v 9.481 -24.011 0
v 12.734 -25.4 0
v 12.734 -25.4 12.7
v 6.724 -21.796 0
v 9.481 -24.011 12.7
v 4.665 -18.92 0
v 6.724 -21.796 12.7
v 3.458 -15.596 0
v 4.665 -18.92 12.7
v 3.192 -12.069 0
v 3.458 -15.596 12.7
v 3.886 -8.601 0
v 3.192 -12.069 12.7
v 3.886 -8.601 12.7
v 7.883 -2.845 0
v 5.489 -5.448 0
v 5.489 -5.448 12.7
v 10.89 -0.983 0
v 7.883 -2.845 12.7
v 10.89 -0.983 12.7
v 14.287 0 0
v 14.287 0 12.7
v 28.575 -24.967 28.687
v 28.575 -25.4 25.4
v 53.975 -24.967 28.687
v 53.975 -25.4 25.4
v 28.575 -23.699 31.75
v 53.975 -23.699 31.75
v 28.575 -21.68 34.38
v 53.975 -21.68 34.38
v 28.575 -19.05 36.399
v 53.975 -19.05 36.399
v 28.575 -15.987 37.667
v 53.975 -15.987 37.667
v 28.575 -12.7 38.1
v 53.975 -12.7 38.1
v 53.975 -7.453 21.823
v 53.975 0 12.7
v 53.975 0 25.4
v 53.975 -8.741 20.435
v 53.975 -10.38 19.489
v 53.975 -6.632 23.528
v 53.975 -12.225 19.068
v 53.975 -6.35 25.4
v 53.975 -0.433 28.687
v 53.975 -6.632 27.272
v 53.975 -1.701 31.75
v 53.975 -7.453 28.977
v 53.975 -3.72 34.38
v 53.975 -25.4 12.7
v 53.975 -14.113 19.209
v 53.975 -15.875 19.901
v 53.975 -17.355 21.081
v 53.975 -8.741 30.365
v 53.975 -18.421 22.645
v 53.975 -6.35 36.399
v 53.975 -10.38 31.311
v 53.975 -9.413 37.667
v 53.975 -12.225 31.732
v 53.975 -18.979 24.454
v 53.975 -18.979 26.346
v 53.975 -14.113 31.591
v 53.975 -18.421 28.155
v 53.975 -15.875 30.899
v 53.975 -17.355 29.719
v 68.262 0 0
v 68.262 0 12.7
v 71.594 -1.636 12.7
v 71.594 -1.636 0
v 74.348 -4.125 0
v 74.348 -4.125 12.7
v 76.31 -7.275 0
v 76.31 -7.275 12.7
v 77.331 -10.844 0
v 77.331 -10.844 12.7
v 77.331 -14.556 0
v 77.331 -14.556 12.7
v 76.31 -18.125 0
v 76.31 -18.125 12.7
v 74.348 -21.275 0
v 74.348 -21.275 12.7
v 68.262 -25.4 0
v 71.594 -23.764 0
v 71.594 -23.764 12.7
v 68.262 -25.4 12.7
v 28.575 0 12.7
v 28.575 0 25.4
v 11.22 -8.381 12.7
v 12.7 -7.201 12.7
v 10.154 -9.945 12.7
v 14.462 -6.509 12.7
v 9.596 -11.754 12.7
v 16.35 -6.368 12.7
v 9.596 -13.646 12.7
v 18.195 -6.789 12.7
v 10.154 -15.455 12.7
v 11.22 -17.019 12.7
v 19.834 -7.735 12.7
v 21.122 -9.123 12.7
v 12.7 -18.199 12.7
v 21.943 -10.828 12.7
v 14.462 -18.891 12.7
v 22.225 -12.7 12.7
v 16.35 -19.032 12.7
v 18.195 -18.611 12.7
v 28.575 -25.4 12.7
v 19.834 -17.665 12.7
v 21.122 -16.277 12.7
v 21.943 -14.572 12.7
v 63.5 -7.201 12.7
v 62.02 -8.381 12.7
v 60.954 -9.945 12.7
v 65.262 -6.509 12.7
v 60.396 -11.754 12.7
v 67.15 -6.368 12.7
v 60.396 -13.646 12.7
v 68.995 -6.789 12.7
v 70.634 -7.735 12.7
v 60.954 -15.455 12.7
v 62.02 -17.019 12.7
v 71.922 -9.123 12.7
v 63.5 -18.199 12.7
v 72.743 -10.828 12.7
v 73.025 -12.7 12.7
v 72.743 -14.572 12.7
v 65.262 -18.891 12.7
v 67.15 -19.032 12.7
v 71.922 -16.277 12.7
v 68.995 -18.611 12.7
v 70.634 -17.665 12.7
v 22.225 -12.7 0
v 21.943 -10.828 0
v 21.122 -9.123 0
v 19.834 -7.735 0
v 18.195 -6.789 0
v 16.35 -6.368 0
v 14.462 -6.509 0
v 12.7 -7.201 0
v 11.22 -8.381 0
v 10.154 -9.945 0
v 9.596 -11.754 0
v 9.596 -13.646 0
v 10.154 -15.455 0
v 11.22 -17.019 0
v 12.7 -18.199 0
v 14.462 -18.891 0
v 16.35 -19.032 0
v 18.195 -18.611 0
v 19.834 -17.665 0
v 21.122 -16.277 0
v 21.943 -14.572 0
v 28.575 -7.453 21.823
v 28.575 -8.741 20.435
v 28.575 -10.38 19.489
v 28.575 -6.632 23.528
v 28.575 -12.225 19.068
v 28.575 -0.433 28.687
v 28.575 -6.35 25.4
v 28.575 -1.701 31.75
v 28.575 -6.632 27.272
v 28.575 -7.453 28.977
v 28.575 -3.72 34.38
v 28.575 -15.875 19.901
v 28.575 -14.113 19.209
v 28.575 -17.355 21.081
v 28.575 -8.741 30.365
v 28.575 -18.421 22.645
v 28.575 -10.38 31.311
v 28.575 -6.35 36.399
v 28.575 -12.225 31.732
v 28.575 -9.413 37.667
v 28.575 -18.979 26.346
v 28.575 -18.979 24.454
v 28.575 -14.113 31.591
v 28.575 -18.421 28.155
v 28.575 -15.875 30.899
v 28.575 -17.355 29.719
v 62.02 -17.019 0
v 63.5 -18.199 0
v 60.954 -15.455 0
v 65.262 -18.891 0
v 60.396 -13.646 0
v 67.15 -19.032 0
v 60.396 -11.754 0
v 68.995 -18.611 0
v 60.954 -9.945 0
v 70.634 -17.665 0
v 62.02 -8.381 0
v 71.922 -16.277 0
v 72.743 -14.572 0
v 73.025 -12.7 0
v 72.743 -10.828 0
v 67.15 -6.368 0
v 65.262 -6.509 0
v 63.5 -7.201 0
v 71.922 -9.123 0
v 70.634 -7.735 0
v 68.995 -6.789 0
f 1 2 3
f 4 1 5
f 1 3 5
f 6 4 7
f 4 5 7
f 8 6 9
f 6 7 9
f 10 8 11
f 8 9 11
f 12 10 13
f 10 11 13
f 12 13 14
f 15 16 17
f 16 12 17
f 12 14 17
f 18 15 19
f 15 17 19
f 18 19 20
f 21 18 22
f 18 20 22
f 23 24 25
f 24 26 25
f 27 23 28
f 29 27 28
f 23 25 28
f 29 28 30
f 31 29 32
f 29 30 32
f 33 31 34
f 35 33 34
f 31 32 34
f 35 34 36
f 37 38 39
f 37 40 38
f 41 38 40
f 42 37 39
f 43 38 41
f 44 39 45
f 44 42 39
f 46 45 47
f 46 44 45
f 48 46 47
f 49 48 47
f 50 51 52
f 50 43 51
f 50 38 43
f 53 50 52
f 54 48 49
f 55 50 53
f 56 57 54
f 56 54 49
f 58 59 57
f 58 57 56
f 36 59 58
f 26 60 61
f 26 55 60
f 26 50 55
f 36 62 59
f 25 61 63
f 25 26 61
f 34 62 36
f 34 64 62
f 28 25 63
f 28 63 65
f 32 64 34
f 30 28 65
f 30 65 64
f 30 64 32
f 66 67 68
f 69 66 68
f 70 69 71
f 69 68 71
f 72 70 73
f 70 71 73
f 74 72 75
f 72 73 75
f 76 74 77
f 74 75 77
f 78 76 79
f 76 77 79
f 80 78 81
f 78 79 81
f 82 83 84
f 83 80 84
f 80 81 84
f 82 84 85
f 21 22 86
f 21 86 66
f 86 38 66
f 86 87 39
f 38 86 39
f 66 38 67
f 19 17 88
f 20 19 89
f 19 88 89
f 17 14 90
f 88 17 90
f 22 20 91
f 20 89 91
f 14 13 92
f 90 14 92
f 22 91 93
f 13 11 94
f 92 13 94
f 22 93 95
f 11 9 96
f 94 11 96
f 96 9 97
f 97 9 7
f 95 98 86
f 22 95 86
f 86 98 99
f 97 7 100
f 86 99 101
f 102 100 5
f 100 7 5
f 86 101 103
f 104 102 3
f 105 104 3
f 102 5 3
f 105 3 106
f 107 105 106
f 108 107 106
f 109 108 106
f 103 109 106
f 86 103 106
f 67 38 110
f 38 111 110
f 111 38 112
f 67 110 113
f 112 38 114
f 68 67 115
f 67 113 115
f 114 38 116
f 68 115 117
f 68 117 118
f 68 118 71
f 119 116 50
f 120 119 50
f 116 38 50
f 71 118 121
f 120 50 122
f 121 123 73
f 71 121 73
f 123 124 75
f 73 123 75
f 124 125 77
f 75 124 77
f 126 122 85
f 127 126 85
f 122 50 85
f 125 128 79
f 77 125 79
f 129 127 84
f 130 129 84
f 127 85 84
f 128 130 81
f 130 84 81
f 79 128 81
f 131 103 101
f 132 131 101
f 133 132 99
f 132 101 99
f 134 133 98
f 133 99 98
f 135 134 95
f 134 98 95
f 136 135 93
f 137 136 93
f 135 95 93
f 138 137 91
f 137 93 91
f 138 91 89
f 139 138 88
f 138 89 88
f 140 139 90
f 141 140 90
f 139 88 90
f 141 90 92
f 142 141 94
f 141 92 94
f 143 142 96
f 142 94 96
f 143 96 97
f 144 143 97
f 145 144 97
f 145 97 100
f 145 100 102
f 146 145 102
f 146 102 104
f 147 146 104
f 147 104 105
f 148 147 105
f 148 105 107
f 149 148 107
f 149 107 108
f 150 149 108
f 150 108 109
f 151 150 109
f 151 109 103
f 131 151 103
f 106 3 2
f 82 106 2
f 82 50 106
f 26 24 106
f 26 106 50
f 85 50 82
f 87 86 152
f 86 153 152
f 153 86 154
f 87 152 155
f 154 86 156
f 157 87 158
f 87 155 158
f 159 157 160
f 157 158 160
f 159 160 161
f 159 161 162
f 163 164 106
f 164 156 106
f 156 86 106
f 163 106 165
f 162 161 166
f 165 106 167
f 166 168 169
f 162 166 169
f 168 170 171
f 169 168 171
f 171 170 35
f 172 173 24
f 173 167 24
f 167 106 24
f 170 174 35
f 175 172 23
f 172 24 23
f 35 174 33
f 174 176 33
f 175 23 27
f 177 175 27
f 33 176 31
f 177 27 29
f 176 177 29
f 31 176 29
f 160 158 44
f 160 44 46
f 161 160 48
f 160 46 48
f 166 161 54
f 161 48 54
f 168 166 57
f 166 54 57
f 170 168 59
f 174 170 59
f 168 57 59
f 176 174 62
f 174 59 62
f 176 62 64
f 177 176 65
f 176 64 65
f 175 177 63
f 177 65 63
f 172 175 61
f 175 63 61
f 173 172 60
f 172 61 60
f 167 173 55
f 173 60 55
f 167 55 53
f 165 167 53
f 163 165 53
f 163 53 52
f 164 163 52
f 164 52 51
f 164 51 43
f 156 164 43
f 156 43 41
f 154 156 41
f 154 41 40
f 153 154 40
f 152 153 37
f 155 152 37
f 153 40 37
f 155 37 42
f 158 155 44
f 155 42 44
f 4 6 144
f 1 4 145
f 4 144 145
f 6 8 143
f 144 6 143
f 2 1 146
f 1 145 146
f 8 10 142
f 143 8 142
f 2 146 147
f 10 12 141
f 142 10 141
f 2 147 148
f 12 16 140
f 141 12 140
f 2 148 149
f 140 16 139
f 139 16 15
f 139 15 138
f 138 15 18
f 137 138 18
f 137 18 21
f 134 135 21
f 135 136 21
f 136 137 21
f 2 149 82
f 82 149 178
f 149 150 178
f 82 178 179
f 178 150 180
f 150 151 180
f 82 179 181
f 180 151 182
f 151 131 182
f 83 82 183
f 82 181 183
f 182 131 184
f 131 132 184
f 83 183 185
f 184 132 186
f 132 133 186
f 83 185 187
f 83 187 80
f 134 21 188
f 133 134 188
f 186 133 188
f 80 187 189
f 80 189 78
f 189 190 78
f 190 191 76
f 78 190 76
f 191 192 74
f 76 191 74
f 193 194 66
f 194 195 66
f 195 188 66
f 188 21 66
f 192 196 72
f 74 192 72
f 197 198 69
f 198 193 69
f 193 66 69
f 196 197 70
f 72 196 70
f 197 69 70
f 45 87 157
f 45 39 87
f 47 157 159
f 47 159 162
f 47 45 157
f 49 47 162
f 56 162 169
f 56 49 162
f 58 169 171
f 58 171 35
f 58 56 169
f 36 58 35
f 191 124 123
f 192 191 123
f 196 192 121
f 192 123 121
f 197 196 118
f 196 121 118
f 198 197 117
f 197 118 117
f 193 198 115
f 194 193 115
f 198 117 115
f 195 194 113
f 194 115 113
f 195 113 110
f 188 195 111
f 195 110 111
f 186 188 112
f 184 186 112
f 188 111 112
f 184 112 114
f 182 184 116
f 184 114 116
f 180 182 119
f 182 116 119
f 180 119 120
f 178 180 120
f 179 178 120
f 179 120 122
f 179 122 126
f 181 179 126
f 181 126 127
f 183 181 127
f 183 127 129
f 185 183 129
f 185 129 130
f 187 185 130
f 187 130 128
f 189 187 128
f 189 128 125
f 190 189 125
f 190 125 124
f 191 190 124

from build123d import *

# Parameters (mm, degrees)
F0_W      = 82.55
F0_H      = 38.1
F1_DEPTH  = 25.4
F2_W      = 28.575
F2_H      = 25.4
F3_DEPTH  = 25.4
F4_R      = 12.69999
F6_DEPTH  = 25.4
F8_DEPTH  = 25.4
F9_R      = 6.35
F10_DEPTH = 25.4
F11_R     = 6.35
F12_DEPTH = 25.4
F13_R     = 6.35
F14_DEPTH = 25.4


# Not quite as in the source:
# - a fillet or chamfer is up to 0.001 mm smaller than in the source, because OpenCascade refuses the exact size
# - a feature names something its author has since deleted; it is built from what else it names


with BuildPart() as f1:
    # F0 (on Front) → F1 (new body)
    with BuildSketch(Plane.XZ):
        with Locations((41.275, 19.05)):
            Rectangle(F0_W, F0_H)
    extrude(amount=F1_DEPTH)

    # F2 (on face) → F3 (cut)
    with BuildSketch(Plane.XZ.offset(25.4)):
        with Locations((14.2875, 25.4)):
            Rectangle(F2_W, F2_H)
        with Locations((68.2625, 25.4)):
            Rectangle(F2_W, F2_H)
    extrude(amount=-F3_DEPTH, mode=Mode.SUBTRACT)

    # F4 (radius 12.7 in the source; OpenCascade refuses exactly that, so slightly less here)
    f4_edges = [f1.edges().sort_by_distance(p)[0] for p in [
        (41.275, 0, 38.1),
        (41.275, -25.4, 38.1),
    ]]
    fillet(f4_edges, radius=F4_R)

    # F5 (on face) → F6 (cut)
    with BuildSketch(Plane.XY.offset(12.7)):
        with BuildLine():
            ThreePointArc((68.2625, 0), (77.4605547287, -12.7), (68.2625, -25.4))
            Line((68.2625, -25.4), (82.55, -25.4))
            Line((82.55, -25.4), (82.55, 0))
            Line((82.55, 0), (68.2625, 0))
        make_face()
    extrude(amount=-F6_DEPTH, mode=Mode.SUBTRACT)

    # F7 (on face) → F8 (cut)
    with BuildSketch(Plane.XY.offset(12.7)):
        with BuildLine():
            ThreePointArc((12.733777985, -25.4), (3.1920308375, -12.0688091081), (14.2875, 0))
            Line((14.2875, 0), (0, 0))
            Line((0, 0), (0, -25.4))
            Line((0, -25.4), (12.733777985, -25.4))
        make_face()
    extrude(amount=-F8_DEPTH, mode=Mode.SUBTRACT)

    # F9 (on face) → F10 (cut)
    with BuildSketch(Plane.XY.offset(12.7)):
        with Locations((66.675, -12.7)):
            Circle(F9_R)
    extrude(amount=-F10_DEPTH, mode=Mode.SUBTRACT)

    # F11 (on face) → F12 (cut)
    with BuildSketch(Plane.XY.offset(12.7)):
        with Locations((15.875, -12.7)):
            Circle(F11_R)
    extrude(amount=-F12_DEPTH, mode=Mode.SUBTRACT)

    # F13 (on face) → F14 (cut)
    with BuildSketch(Plane.YZ.offset(53.975)):
        with Locations((-12.7, 25.4)):
            Circle(F13_R)
    extrude(amount=-F14_DEPTH, mode=Mode.SUBTRACT)


solid = f1.part
